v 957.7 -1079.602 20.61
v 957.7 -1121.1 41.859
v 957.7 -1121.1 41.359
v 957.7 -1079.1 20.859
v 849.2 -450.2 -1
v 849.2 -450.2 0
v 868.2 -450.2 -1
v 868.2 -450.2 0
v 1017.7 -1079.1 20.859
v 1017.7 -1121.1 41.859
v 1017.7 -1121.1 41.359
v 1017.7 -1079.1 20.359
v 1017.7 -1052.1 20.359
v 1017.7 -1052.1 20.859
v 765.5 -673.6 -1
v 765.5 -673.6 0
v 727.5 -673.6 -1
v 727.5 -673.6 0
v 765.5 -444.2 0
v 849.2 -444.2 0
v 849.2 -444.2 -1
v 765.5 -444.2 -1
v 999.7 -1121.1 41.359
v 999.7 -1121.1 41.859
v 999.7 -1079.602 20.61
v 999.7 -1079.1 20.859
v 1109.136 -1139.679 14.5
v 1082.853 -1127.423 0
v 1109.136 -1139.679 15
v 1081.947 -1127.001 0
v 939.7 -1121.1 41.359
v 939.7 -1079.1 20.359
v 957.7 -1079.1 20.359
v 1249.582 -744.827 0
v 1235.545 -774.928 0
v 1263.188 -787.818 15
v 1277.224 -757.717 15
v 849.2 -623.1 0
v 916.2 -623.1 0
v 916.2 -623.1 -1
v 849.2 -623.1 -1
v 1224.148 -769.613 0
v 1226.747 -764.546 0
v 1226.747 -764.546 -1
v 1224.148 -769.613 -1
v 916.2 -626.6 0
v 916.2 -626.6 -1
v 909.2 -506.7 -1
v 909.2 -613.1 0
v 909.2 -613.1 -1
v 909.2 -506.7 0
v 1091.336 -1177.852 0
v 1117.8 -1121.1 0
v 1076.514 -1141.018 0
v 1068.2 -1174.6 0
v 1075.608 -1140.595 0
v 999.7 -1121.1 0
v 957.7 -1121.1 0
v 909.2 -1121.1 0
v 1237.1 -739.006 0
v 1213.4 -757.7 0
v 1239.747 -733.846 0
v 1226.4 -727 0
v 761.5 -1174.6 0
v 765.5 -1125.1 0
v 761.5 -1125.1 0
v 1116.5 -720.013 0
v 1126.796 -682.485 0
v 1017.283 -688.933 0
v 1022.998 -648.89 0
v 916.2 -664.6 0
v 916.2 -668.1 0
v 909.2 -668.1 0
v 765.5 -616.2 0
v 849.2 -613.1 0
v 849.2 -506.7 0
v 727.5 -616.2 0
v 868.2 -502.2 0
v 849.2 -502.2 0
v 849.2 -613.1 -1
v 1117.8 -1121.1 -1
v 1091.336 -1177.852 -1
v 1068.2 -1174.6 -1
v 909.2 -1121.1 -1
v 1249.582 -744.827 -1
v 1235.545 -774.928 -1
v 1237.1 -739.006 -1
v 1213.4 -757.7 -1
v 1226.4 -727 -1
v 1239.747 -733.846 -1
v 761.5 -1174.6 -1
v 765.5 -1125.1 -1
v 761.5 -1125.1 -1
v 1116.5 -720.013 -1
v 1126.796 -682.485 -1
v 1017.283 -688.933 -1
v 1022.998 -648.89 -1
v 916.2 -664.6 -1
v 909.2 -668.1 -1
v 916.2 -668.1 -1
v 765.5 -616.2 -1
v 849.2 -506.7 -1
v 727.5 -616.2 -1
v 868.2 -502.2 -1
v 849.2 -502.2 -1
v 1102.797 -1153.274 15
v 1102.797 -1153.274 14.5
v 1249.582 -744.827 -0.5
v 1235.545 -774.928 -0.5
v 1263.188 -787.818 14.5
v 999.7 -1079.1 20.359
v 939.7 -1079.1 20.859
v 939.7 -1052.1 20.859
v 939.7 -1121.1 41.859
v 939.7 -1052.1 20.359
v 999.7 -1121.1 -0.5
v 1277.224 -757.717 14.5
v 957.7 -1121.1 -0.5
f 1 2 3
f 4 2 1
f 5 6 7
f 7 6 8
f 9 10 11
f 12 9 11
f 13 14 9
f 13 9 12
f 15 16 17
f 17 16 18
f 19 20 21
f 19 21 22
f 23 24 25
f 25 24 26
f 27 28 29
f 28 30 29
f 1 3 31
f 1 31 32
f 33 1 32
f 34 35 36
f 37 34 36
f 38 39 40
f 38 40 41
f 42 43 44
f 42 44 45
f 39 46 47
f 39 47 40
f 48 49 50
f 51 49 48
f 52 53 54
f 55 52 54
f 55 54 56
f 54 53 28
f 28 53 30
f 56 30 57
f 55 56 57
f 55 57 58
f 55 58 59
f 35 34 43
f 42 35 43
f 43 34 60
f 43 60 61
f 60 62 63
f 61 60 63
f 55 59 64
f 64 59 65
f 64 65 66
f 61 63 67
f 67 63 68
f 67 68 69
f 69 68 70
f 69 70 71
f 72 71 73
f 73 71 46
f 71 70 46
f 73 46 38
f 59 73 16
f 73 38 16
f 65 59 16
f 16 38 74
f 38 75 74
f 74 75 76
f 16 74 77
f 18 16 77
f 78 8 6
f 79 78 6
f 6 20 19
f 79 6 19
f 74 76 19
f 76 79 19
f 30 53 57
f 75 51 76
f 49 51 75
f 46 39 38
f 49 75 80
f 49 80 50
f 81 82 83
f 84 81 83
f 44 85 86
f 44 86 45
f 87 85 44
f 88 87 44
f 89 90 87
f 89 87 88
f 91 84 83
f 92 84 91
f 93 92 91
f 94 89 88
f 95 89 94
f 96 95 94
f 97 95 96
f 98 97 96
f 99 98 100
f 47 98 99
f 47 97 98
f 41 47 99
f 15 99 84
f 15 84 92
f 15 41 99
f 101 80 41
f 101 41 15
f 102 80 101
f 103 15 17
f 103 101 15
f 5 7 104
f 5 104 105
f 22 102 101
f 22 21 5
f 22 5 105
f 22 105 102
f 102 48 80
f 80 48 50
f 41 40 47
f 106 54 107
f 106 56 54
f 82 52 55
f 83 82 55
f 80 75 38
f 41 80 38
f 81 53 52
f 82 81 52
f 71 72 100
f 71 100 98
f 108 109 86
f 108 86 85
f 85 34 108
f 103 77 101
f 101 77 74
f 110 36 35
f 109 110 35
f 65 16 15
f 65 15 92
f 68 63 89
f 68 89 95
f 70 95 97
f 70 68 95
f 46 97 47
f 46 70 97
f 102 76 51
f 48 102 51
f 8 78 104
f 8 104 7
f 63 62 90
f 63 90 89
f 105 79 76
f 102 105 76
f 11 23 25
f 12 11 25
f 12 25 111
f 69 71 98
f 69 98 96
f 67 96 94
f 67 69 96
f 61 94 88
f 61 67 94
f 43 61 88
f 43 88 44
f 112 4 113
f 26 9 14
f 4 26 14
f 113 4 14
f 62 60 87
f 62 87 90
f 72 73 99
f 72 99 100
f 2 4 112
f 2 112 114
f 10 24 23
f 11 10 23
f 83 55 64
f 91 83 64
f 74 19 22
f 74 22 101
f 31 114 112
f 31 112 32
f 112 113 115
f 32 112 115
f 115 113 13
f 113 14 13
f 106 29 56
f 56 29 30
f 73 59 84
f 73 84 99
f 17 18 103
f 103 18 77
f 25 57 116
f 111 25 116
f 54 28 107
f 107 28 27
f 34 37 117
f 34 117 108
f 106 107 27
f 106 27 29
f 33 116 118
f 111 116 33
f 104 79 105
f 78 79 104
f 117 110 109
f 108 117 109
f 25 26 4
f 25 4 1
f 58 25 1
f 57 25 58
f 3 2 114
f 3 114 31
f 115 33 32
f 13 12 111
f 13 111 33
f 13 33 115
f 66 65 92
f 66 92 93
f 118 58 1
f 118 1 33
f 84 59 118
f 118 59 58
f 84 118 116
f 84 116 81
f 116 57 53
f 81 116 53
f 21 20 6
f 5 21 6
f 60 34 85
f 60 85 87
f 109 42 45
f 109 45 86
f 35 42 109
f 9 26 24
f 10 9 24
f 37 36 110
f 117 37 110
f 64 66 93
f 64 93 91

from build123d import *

# Parameters (mm, degrees)
SKETCH_1_W      = 19
SKETCH_1_H      = 52
SKETCH_1_W_2    = 60
SKETCH_1_H_2    = 60
SKETCH_1_H_3    = 106.4
SKETCH_1_H_4    = 111
SKETCH_1_H_5    = 111.3
SKETCH_1_H_6    = 112
SKETCH_1_H_7    = 113
SKETCH_1_H_8    = 116.5
SKETCH_1_H_9    = 131.6
EXTRUDE_1_DEPTH = 1
EXTRUDE_2_DEPTH = 1
EXTRUDE_3_DEPTH = 33.212704
SKETCH_4_W      = 0.5
SKETCH_4_H      = 27
EXTRUDE_4_DEPTH = 42
SKETCH_5_W      = 0.5
SKETCH_5_H      = 27
EXTRUDE_5_DEPTH = 18
EXTRUDE_6_DEPTH = 1
EXTRUDE_7_DEPTH = 15


with BuildPart() as part:
    # 草图1 → 拉伸1 (new body)
    with BuildSketch(Plane.XY):
        with Locations((858.7, -476.2)):
            Rectangle(SKETCH_1_W, SKETCH_1_H)
        Polygon((825.5, -1174.6), (825.5, -1125.1), (765.5, -1125.1), (761.5, -1125.1), (761.5, -1174.6), (765.5, -1174.6), align=None)
        Polygon((849.2, -1121.1), (909.2, -1121.1), (909.2, -1091.6), (909.2, -1064), (849.2, -1064), align=None)
        with Locations((795.5, -474.2)):
            Rectangle(SKETCH_1_W_2, SKETCH_1_H_2)
        with Locations((879.2, -559.9)):
            Rectangle(SKETCH_1_W_2, SKETCH_1_H_3)
        Polygon((909.2, -953.1), (849.2, -953.1), (849.2, -1050.1), (849.2, -1064), (909.2, -1064), align=None)
        with Locations((795.5, -953.1)):
            Rectangle(SKETCH_1_W_2, SKETCH_1_H_4)
        with Locations((795.5, -842.1)):
            Rectangle(SKETCH_1_W_2, SKETCH_1_H_4)
        with Locations((879.2, -897.45)):
            Rectangle(SKETCH_1_W_2, SKETCH_1_H_5)
        with Locations((795.5, -560.2)):
            Rectangle(SKETCH_1_W_2, SKETCH_1_H_6)
        with Locations((795.5, -730.1)):
            Rectangle(SKETCH_1_W_2, SKETCH_1_H_7)
        with Locations((795.5, -1066.85)):
            Rectangle(SKETCH_1_W_2, SKETCH_1_H_8)
        with Locations((879.2, -776)):
            Rectangle(SKETCH_1_W_2, SKETCH_1_H_9)
        Polygon((849.2, -1121.1), (909.2, -1121.1), (1031.2, -1121.1), (1031.2, -1174.6), (849.2, -1174.6), align=None)
        with BuildLine():
            Line((1213.4, -757.7), (1226.4, -727))
            ThreePointArc((1226.4, -727), (1075.34720829, -664.295577574), (916.2, -626.6))
            Line((916.2, -626.6), (916.2, -623.1))
            Line((916.2, -623.1), (849.2, -623.1))
            Line((849.2, -623.1), (849.2, -668.1))
            Line((849.2, -668.1), (849.2, -681.1))
            Line((849.2, -681.1), (849.2, -710.2))
            Line((849.2, -710.2), (909.2, -710.2))
            Line((909.2, -710.2), (909.2, -668.1))
            Line((909.2, -668.1), (916.2, -668.1))
            Line((916.2, -668.1), (916.2, -664.6))
            ThreePointArc((916.2, -664.6), (1067.153405165, -703.637303814), (1213.4, -757.7))
        make_face()
        Polygon((765.5, -616.2), (825.5, -616.2), (825.5, -504.2), (825.5, -444.2), (849.2, -444.2), (849.2, -450.2), (849.2, -502.2), (849.2, -506.7), (849.2, -613.1), (849.2, -623.1), (849.2, -668.1), (849.2, -681.1), (849.2, -710.2), (849.2, -841.8), (849.2, -953.1), (849.2, -1050.1), (849.2, -1064), (849.2, -1121.1), (849.2, -1174.6), (825.5, -1174.6), (825.5, -1125.1), (825.5, -1008.6), (825.5, -897.6), (825.5, -786.6), (825.5, -673.6), (765.5, -673.6), (727.5, -673.6), (727.5, -616.2), align=None)
    extrude(amount=-EXTRUDE_1_DEPTH)

    # 草图2 → 拉伸2 (add)
    with BuildSketch(Plane.XY):
        Polygon((1237.099840045, -739.006390924), (1239.746814184, -733.845622773), (1226.4, -727), (1213.4, -757.7), (1226.746814184, -764.545622773), (1224.14778512, -769.612913087), (1235.545483088, -774.927746934), (1249.581778451, -744.826814391), align=None)
    extrude(amount=-EXTRUDE_2_DEPTH)

    # 草图3 → 拉伸3 (add)
    with BuildSketch(Plane(origin=(-76.138469502, -163.279474765, 0), x_dir=(0.9063077870373919, -0.42261826173910827, 0), z_dir=(-0.42261826173910827, -0.9063077870373919, 0))):
        Polygon((1447.283109945, 0), (1477.783109945, 15), (1477.783109945, 14.5), (1447.283109945, -0.5), align=None)
    extrude(amount=-EXTRUDE_3_DEPTH)

    # 草图4 → 拉伸4 (add)
    with BuildSketch(Plane(origin=(999.7, -1174.6, 0), x_dir=(0, 0, -1), z_dir=(1, 0, 0))):
        with Locations((-20.608674231, 109)):
            Rectangle(SKETCH_4_W, SKETCH_4_H)
        Polygon((-20.858674231, 95.5), (0, 53.5), (0.5, 53.5), (-20.358674231, 95.5), align=None)
    extrude(amount=-EXTRUDE_4_DEPTH)

    # 草图5 → 拉伸5 (add)
    with BuildSketch(Plane(origin=(999.7, -1174.6, 0), x_dir=(0, 0, -1), z_dir=(1, 0, 0))):
        with Locations((-20.608674231, 109)):
            Rectangle(SKETCH_5_W, SKETCH_5_H)
        Polygon((-41.858674231, 53.5), (-41.358674231, 53.5), (-20.358674231, 95.5), (-20.858674231, 95.5), align=None)
    extrude_5 = extrude(amount=EXTRUDE_5_DEPTH)

    # 镜像1: 拉伸5 across plane
    add(extrude_5.mirror(Plane(origin=(978.7, -1174.6, 0), x_dir=(0, 0, 1), z_dir=(-1, 0, 0))))

    # 草图6 → 拉伸6 (add)
    with BuildSketch(Plane.XY):
        Polygon((1031.2, -1121.1), (1117.8, -1121.1), (1091.336296883, -1177.851594476), (1068.2, -1174.6), (1031.2, -1174.6), align=None)
    extrude(amount=-EXTRUDE_6_DEPTH)

    # 草图7 → 拉伸7 (add)
    with BuildSketch(Plane(origin=(1109.136325634, -1139.679309634, 0), x_dir=(0.9063077870366769, -0.422618261740642, 0), z_dir=(-0.422618261740642, -0.9063077870366769, 0))):
        Polygon((-30, -0.5), (0, 14.5), (0, 15), (-30, 0), align=None)
    extrude(amount=EXTRUDE_7_DEPTH)


solid = part.part
